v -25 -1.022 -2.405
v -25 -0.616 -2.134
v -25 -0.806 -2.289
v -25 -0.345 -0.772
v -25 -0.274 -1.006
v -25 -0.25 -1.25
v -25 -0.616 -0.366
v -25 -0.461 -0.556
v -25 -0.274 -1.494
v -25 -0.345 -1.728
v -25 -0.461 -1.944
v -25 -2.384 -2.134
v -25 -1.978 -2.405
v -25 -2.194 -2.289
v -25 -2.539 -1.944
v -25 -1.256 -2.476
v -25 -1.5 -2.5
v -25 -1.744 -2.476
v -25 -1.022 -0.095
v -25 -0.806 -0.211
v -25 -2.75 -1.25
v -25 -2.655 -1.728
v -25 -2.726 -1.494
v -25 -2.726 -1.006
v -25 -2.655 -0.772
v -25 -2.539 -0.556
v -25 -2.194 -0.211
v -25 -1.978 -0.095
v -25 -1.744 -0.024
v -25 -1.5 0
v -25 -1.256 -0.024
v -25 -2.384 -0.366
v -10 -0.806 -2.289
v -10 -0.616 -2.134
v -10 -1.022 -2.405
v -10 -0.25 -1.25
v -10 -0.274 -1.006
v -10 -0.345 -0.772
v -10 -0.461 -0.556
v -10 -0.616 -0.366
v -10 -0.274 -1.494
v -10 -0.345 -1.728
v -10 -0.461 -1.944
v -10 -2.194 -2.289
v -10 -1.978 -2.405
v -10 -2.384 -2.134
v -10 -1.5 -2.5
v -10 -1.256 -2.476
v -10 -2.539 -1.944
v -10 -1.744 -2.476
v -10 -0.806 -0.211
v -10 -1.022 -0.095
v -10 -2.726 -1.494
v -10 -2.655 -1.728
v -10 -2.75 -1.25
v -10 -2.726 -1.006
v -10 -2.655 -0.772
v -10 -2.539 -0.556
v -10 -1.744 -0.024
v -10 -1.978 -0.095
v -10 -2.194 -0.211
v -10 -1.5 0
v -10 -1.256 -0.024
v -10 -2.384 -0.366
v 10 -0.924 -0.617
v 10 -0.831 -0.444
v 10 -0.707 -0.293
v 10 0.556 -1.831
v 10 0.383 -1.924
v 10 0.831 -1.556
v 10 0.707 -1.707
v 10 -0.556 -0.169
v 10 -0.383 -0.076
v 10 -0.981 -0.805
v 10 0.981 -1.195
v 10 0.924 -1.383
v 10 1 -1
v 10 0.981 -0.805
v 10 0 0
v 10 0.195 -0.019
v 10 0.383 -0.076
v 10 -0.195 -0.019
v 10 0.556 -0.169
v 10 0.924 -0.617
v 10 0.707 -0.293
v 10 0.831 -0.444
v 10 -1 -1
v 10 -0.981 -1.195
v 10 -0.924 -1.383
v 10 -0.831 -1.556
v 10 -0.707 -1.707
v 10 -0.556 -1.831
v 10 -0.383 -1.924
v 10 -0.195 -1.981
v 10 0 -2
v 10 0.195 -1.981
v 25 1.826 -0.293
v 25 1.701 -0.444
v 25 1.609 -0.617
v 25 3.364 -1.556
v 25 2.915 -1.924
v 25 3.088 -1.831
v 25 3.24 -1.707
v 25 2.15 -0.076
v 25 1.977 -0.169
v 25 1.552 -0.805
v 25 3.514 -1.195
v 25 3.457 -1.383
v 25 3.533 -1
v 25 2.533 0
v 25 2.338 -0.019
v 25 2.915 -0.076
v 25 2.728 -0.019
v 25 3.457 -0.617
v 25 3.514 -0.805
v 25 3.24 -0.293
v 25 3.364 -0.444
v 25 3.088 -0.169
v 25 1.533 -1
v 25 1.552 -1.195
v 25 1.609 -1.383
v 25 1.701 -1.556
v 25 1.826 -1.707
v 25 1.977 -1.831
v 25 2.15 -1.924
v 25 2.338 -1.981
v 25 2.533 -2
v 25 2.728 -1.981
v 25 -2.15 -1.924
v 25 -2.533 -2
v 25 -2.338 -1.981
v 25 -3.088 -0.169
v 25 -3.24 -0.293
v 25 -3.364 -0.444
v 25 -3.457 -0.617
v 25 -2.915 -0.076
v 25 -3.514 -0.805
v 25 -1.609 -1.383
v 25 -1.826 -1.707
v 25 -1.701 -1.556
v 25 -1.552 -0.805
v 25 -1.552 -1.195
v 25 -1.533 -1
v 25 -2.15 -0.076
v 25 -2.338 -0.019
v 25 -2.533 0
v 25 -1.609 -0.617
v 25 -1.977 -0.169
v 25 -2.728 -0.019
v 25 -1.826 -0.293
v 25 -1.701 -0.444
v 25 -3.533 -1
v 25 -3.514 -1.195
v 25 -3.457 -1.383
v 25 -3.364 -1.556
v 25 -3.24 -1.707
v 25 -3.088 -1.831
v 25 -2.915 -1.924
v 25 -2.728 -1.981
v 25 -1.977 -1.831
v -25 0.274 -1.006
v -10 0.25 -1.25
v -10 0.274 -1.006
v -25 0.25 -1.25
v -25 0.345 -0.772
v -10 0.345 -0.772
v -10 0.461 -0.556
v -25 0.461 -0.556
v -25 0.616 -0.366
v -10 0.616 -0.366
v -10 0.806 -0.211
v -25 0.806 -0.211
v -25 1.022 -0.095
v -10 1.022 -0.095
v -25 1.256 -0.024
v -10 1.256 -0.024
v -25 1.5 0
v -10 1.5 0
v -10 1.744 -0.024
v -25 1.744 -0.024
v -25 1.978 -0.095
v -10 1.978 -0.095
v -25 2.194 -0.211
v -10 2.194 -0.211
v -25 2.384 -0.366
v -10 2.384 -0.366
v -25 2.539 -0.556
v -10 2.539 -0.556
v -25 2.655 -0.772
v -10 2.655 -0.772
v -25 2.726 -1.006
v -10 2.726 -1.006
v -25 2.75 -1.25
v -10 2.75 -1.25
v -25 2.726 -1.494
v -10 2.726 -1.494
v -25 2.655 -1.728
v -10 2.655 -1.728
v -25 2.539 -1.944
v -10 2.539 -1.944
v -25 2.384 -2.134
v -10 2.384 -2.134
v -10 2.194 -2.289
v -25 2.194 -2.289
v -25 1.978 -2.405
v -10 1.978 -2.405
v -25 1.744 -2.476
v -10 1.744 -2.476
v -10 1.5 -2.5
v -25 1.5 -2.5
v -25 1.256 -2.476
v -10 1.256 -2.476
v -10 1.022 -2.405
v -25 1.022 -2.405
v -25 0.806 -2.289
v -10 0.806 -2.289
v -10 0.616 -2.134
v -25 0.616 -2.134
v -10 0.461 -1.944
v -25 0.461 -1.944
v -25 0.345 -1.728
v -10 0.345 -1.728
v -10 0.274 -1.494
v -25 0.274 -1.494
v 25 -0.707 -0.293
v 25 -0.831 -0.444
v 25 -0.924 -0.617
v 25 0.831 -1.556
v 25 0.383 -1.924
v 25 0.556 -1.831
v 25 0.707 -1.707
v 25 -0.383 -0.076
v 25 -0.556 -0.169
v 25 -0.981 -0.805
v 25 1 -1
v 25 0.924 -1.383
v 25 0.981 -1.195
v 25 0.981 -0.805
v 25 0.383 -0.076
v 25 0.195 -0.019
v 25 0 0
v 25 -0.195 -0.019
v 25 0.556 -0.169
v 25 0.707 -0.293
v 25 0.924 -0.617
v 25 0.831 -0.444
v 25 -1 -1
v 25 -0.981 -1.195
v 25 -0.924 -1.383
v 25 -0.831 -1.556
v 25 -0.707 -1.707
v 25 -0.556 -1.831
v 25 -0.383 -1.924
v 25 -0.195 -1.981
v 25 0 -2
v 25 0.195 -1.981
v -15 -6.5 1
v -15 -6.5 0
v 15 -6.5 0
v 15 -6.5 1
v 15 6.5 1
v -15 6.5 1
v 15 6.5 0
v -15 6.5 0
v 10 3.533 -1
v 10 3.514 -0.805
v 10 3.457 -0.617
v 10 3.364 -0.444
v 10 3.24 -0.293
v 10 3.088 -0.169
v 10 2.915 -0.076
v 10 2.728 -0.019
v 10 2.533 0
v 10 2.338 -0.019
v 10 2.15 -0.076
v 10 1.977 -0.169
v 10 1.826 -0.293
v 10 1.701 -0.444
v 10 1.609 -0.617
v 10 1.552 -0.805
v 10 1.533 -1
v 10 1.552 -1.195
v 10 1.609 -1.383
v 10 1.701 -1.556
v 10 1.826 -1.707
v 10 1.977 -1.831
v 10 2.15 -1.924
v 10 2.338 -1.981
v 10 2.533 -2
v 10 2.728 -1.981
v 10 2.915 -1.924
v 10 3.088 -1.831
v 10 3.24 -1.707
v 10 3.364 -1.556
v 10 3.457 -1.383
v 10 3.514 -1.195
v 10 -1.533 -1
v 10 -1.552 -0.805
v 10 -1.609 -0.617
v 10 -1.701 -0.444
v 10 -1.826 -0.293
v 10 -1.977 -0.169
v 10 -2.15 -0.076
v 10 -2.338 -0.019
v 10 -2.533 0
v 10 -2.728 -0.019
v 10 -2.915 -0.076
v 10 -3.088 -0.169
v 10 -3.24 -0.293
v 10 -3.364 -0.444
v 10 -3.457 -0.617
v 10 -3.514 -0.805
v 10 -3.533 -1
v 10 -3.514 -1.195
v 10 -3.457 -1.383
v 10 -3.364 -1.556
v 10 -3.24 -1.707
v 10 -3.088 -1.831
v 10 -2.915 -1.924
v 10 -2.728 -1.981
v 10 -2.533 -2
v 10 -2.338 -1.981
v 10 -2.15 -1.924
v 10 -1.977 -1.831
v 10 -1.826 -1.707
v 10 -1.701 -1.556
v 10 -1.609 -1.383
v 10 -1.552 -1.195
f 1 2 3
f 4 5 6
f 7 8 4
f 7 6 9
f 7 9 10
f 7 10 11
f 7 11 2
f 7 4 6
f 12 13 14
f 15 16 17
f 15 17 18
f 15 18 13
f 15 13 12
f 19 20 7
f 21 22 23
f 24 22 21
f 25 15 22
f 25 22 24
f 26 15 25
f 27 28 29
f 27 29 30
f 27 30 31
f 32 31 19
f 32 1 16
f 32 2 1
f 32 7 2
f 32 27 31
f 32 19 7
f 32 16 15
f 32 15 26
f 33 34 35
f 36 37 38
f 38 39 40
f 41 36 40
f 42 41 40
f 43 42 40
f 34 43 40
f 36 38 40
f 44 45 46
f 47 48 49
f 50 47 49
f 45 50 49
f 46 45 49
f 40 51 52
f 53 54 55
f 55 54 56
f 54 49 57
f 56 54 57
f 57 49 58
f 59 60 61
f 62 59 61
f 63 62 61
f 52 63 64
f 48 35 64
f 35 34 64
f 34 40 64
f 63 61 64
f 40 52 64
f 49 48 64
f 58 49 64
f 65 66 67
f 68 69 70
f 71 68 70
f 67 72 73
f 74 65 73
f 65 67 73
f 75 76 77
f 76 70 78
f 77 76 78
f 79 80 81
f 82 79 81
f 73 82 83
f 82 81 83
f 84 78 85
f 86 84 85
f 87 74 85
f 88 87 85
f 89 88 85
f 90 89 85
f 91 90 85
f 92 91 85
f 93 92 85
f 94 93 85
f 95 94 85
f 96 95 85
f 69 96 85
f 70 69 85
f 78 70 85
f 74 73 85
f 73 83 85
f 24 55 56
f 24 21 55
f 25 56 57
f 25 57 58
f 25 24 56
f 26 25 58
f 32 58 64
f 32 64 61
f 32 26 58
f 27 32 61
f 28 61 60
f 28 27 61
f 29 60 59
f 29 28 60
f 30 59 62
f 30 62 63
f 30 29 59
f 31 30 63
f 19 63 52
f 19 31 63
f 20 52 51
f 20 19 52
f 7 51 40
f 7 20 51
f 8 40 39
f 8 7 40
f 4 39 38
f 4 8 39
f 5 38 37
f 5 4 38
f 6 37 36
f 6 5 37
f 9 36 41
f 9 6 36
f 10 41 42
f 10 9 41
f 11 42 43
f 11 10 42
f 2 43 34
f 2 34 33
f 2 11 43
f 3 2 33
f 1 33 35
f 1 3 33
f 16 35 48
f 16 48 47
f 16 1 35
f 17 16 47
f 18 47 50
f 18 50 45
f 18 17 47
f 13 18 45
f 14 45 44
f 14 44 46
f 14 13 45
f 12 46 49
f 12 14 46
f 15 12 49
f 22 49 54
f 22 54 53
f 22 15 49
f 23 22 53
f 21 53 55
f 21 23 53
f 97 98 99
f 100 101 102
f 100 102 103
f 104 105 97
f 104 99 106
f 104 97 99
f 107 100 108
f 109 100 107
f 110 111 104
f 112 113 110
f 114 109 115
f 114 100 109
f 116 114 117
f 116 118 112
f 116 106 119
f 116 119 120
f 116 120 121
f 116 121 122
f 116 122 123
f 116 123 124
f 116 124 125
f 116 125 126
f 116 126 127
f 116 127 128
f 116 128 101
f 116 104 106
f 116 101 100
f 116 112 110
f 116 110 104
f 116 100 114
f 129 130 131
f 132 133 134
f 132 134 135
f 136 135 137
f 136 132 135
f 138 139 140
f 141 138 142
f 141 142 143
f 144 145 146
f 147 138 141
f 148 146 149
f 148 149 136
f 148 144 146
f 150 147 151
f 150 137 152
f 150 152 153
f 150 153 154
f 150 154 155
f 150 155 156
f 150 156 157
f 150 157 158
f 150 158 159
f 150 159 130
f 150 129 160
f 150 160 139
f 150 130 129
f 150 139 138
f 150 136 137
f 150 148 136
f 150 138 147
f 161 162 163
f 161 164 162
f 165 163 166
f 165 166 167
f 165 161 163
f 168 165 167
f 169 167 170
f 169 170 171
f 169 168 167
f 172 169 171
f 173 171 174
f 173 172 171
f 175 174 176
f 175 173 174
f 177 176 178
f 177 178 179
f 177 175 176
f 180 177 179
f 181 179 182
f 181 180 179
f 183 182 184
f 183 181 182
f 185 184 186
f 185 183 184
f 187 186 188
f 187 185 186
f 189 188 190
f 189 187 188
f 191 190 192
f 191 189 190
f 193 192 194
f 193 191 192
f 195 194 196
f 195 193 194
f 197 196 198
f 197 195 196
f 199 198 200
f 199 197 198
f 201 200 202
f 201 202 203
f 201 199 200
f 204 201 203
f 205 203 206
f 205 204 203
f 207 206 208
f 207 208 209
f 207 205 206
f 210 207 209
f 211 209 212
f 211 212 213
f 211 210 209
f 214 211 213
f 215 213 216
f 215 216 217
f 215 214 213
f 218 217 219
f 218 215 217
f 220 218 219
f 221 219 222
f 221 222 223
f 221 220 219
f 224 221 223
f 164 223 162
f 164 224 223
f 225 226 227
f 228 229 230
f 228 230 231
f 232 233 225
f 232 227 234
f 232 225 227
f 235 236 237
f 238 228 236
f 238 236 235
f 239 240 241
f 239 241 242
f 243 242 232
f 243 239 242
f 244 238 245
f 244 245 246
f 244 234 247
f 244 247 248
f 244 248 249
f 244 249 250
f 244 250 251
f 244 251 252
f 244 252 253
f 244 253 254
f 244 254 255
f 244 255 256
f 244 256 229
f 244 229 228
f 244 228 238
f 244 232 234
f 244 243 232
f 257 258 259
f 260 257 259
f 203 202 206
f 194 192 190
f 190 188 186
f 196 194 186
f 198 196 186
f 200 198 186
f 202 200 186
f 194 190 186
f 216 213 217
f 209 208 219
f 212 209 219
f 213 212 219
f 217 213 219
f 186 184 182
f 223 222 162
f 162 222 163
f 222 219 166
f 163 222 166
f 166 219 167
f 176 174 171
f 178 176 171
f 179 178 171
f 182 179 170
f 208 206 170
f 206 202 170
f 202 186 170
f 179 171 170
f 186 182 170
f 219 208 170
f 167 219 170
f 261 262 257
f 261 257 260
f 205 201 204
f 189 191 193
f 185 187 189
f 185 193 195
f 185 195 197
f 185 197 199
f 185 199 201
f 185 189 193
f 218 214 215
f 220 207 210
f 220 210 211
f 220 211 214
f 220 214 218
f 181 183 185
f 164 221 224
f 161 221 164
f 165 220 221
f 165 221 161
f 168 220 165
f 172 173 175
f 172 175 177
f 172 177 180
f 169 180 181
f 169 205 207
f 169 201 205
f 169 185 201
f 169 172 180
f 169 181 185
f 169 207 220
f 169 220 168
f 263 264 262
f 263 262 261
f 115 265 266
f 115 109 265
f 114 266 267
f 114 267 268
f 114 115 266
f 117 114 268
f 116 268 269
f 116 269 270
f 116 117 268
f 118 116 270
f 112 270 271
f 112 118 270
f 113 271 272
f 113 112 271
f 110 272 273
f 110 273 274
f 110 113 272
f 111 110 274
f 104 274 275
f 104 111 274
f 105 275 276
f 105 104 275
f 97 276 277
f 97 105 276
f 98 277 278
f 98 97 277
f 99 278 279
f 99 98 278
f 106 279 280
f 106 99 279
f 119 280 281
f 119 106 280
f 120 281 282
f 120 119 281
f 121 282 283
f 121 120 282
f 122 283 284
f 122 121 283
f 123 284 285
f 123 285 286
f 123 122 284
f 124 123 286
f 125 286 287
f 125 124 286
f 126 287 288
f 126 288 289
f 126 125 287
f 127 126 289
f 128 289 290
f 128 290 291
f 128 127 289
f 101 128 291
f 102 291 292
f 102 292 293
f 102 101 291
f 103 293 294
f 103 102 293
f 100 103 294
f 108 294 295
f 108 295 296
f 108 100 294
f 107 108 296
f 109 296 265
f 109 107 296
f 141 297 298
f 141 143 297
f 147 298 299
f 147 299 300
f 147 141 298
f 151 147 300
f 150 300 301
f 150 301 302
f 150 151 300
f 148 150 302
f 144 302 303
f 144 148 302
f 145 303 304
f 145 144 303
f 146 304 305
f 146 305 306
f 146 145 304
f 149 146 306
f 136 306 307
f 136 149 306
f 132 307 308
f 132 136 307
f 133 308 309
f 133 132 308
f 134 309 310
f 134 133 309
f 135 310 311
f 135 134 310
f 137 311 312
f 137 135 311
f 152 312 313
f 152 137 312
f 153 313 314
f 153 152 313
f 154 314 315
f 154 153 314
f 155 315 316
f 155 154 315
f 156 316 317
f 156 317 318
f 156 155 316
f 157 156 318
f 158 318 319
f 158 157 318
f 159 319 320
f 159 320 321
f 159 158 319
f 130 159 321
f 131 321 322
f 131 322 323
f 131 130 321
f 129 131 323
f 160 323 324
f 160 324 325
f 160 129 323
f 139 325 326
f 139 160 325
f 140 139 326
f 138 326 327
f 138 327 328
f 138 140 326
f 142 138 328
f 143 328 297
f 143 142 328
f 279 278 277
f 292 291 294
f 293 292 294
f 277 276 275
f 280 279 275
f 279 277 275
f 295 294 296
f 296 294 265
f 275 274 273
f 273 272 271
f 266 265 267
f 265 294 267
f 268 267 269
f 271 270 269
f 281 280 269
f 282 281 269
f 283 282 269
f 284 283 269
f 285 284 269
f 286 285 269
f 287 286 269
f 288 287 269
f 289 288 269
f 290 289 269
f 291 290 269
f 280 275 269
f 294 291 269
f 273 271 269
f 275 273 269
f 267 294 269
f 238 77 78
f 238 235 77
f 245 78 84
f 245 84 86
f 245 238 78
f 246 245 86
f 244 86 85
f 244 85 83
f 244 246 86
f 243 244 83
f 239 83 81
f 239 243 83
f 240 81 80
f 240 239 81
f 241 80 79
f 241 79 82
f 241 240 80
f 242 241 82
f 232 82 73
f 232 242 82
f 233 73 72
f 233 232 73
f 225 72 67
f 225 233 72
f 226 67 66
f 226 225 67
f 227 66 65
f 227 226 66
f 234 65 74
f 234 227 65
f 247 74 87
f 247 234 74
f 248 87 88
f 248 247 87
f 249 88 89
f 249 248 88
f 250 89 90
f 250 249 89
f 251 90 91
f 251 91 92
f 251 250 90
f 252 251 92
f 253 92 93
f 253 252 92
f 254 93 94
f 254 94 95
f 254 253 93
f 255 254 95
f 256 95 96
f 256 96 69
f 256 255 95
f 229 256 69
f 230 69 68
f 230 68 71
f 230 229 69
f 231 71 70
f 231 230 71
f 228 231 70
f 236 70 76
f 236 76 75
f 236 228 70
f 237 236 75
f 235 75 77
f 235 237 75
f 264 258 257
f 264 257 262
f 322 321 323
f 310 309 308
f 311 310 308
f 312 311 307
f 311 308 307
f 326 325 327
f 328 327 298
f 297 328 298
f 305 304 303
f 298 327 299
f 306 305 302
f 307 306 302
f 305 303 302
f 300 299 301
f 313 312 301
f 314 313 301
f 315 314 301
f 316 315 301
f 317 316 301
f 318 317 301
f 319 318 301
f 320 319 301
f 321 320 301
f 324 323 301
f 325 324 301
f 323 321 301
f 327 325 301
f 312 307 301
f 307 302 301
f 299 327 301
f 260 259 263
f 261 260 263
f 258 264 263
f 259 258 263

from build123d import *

# Parameters (mm, degrees)
F0_W          = 30
F0_H          = 13
F1_DEPTH      = 1
F2_R          = 1
F3_DEPTH      = 10
F3_DEPTH_BACK = 5
F4_R          = 1.25
F5_DEPTH      = 10
F5_DEPTH_BACK = 5


with BuildPart() as f1:
    # F0 (on Top) → F1 (new body)
    with BuildSketch(Plane.XY):
        Rectangle(F0_W, F0_H)
    extrude(amount=F1_DEPTH)


with BuildPart() as f3:
    # F2 (on face) → F3 (new body, two sides)
    with BuildSketch(Plane.YZ.offset(15)) as f3_sk:
        with Locations((-2.53274, -1)):
            Circle(F2_R)
        with Locations((0, -1)):
            Circle(F2_R)
        with Locations((2.53274, -1)):
            Circle(F2_R)
    extrude(amount=F3_DEPTH)
    extrude(f3_sk.sketch, amount=-F3_DEPTH_BACK)


with BuildPart() as f5:
    # F4 (on face) → F5 (new body, two sides)
    with BuildSketch(Plane(origin=(-15, 0, 0), x_dir=(0, -1, 0), z_dir=(-1, 0, 0))) as f5_sk:
        with Locations((-1.5, -1.25)):
            Circle(F4_R)
        with Locations((1.5, -1.25)):
            Circle(F4_R)
    extrude(amount=F5_DEPTH)
    extrude(f5_sk.sketch, amount=-F5_DEPTH_BACK)


solid = Compound([f1.part, f3.part, f5.part])
